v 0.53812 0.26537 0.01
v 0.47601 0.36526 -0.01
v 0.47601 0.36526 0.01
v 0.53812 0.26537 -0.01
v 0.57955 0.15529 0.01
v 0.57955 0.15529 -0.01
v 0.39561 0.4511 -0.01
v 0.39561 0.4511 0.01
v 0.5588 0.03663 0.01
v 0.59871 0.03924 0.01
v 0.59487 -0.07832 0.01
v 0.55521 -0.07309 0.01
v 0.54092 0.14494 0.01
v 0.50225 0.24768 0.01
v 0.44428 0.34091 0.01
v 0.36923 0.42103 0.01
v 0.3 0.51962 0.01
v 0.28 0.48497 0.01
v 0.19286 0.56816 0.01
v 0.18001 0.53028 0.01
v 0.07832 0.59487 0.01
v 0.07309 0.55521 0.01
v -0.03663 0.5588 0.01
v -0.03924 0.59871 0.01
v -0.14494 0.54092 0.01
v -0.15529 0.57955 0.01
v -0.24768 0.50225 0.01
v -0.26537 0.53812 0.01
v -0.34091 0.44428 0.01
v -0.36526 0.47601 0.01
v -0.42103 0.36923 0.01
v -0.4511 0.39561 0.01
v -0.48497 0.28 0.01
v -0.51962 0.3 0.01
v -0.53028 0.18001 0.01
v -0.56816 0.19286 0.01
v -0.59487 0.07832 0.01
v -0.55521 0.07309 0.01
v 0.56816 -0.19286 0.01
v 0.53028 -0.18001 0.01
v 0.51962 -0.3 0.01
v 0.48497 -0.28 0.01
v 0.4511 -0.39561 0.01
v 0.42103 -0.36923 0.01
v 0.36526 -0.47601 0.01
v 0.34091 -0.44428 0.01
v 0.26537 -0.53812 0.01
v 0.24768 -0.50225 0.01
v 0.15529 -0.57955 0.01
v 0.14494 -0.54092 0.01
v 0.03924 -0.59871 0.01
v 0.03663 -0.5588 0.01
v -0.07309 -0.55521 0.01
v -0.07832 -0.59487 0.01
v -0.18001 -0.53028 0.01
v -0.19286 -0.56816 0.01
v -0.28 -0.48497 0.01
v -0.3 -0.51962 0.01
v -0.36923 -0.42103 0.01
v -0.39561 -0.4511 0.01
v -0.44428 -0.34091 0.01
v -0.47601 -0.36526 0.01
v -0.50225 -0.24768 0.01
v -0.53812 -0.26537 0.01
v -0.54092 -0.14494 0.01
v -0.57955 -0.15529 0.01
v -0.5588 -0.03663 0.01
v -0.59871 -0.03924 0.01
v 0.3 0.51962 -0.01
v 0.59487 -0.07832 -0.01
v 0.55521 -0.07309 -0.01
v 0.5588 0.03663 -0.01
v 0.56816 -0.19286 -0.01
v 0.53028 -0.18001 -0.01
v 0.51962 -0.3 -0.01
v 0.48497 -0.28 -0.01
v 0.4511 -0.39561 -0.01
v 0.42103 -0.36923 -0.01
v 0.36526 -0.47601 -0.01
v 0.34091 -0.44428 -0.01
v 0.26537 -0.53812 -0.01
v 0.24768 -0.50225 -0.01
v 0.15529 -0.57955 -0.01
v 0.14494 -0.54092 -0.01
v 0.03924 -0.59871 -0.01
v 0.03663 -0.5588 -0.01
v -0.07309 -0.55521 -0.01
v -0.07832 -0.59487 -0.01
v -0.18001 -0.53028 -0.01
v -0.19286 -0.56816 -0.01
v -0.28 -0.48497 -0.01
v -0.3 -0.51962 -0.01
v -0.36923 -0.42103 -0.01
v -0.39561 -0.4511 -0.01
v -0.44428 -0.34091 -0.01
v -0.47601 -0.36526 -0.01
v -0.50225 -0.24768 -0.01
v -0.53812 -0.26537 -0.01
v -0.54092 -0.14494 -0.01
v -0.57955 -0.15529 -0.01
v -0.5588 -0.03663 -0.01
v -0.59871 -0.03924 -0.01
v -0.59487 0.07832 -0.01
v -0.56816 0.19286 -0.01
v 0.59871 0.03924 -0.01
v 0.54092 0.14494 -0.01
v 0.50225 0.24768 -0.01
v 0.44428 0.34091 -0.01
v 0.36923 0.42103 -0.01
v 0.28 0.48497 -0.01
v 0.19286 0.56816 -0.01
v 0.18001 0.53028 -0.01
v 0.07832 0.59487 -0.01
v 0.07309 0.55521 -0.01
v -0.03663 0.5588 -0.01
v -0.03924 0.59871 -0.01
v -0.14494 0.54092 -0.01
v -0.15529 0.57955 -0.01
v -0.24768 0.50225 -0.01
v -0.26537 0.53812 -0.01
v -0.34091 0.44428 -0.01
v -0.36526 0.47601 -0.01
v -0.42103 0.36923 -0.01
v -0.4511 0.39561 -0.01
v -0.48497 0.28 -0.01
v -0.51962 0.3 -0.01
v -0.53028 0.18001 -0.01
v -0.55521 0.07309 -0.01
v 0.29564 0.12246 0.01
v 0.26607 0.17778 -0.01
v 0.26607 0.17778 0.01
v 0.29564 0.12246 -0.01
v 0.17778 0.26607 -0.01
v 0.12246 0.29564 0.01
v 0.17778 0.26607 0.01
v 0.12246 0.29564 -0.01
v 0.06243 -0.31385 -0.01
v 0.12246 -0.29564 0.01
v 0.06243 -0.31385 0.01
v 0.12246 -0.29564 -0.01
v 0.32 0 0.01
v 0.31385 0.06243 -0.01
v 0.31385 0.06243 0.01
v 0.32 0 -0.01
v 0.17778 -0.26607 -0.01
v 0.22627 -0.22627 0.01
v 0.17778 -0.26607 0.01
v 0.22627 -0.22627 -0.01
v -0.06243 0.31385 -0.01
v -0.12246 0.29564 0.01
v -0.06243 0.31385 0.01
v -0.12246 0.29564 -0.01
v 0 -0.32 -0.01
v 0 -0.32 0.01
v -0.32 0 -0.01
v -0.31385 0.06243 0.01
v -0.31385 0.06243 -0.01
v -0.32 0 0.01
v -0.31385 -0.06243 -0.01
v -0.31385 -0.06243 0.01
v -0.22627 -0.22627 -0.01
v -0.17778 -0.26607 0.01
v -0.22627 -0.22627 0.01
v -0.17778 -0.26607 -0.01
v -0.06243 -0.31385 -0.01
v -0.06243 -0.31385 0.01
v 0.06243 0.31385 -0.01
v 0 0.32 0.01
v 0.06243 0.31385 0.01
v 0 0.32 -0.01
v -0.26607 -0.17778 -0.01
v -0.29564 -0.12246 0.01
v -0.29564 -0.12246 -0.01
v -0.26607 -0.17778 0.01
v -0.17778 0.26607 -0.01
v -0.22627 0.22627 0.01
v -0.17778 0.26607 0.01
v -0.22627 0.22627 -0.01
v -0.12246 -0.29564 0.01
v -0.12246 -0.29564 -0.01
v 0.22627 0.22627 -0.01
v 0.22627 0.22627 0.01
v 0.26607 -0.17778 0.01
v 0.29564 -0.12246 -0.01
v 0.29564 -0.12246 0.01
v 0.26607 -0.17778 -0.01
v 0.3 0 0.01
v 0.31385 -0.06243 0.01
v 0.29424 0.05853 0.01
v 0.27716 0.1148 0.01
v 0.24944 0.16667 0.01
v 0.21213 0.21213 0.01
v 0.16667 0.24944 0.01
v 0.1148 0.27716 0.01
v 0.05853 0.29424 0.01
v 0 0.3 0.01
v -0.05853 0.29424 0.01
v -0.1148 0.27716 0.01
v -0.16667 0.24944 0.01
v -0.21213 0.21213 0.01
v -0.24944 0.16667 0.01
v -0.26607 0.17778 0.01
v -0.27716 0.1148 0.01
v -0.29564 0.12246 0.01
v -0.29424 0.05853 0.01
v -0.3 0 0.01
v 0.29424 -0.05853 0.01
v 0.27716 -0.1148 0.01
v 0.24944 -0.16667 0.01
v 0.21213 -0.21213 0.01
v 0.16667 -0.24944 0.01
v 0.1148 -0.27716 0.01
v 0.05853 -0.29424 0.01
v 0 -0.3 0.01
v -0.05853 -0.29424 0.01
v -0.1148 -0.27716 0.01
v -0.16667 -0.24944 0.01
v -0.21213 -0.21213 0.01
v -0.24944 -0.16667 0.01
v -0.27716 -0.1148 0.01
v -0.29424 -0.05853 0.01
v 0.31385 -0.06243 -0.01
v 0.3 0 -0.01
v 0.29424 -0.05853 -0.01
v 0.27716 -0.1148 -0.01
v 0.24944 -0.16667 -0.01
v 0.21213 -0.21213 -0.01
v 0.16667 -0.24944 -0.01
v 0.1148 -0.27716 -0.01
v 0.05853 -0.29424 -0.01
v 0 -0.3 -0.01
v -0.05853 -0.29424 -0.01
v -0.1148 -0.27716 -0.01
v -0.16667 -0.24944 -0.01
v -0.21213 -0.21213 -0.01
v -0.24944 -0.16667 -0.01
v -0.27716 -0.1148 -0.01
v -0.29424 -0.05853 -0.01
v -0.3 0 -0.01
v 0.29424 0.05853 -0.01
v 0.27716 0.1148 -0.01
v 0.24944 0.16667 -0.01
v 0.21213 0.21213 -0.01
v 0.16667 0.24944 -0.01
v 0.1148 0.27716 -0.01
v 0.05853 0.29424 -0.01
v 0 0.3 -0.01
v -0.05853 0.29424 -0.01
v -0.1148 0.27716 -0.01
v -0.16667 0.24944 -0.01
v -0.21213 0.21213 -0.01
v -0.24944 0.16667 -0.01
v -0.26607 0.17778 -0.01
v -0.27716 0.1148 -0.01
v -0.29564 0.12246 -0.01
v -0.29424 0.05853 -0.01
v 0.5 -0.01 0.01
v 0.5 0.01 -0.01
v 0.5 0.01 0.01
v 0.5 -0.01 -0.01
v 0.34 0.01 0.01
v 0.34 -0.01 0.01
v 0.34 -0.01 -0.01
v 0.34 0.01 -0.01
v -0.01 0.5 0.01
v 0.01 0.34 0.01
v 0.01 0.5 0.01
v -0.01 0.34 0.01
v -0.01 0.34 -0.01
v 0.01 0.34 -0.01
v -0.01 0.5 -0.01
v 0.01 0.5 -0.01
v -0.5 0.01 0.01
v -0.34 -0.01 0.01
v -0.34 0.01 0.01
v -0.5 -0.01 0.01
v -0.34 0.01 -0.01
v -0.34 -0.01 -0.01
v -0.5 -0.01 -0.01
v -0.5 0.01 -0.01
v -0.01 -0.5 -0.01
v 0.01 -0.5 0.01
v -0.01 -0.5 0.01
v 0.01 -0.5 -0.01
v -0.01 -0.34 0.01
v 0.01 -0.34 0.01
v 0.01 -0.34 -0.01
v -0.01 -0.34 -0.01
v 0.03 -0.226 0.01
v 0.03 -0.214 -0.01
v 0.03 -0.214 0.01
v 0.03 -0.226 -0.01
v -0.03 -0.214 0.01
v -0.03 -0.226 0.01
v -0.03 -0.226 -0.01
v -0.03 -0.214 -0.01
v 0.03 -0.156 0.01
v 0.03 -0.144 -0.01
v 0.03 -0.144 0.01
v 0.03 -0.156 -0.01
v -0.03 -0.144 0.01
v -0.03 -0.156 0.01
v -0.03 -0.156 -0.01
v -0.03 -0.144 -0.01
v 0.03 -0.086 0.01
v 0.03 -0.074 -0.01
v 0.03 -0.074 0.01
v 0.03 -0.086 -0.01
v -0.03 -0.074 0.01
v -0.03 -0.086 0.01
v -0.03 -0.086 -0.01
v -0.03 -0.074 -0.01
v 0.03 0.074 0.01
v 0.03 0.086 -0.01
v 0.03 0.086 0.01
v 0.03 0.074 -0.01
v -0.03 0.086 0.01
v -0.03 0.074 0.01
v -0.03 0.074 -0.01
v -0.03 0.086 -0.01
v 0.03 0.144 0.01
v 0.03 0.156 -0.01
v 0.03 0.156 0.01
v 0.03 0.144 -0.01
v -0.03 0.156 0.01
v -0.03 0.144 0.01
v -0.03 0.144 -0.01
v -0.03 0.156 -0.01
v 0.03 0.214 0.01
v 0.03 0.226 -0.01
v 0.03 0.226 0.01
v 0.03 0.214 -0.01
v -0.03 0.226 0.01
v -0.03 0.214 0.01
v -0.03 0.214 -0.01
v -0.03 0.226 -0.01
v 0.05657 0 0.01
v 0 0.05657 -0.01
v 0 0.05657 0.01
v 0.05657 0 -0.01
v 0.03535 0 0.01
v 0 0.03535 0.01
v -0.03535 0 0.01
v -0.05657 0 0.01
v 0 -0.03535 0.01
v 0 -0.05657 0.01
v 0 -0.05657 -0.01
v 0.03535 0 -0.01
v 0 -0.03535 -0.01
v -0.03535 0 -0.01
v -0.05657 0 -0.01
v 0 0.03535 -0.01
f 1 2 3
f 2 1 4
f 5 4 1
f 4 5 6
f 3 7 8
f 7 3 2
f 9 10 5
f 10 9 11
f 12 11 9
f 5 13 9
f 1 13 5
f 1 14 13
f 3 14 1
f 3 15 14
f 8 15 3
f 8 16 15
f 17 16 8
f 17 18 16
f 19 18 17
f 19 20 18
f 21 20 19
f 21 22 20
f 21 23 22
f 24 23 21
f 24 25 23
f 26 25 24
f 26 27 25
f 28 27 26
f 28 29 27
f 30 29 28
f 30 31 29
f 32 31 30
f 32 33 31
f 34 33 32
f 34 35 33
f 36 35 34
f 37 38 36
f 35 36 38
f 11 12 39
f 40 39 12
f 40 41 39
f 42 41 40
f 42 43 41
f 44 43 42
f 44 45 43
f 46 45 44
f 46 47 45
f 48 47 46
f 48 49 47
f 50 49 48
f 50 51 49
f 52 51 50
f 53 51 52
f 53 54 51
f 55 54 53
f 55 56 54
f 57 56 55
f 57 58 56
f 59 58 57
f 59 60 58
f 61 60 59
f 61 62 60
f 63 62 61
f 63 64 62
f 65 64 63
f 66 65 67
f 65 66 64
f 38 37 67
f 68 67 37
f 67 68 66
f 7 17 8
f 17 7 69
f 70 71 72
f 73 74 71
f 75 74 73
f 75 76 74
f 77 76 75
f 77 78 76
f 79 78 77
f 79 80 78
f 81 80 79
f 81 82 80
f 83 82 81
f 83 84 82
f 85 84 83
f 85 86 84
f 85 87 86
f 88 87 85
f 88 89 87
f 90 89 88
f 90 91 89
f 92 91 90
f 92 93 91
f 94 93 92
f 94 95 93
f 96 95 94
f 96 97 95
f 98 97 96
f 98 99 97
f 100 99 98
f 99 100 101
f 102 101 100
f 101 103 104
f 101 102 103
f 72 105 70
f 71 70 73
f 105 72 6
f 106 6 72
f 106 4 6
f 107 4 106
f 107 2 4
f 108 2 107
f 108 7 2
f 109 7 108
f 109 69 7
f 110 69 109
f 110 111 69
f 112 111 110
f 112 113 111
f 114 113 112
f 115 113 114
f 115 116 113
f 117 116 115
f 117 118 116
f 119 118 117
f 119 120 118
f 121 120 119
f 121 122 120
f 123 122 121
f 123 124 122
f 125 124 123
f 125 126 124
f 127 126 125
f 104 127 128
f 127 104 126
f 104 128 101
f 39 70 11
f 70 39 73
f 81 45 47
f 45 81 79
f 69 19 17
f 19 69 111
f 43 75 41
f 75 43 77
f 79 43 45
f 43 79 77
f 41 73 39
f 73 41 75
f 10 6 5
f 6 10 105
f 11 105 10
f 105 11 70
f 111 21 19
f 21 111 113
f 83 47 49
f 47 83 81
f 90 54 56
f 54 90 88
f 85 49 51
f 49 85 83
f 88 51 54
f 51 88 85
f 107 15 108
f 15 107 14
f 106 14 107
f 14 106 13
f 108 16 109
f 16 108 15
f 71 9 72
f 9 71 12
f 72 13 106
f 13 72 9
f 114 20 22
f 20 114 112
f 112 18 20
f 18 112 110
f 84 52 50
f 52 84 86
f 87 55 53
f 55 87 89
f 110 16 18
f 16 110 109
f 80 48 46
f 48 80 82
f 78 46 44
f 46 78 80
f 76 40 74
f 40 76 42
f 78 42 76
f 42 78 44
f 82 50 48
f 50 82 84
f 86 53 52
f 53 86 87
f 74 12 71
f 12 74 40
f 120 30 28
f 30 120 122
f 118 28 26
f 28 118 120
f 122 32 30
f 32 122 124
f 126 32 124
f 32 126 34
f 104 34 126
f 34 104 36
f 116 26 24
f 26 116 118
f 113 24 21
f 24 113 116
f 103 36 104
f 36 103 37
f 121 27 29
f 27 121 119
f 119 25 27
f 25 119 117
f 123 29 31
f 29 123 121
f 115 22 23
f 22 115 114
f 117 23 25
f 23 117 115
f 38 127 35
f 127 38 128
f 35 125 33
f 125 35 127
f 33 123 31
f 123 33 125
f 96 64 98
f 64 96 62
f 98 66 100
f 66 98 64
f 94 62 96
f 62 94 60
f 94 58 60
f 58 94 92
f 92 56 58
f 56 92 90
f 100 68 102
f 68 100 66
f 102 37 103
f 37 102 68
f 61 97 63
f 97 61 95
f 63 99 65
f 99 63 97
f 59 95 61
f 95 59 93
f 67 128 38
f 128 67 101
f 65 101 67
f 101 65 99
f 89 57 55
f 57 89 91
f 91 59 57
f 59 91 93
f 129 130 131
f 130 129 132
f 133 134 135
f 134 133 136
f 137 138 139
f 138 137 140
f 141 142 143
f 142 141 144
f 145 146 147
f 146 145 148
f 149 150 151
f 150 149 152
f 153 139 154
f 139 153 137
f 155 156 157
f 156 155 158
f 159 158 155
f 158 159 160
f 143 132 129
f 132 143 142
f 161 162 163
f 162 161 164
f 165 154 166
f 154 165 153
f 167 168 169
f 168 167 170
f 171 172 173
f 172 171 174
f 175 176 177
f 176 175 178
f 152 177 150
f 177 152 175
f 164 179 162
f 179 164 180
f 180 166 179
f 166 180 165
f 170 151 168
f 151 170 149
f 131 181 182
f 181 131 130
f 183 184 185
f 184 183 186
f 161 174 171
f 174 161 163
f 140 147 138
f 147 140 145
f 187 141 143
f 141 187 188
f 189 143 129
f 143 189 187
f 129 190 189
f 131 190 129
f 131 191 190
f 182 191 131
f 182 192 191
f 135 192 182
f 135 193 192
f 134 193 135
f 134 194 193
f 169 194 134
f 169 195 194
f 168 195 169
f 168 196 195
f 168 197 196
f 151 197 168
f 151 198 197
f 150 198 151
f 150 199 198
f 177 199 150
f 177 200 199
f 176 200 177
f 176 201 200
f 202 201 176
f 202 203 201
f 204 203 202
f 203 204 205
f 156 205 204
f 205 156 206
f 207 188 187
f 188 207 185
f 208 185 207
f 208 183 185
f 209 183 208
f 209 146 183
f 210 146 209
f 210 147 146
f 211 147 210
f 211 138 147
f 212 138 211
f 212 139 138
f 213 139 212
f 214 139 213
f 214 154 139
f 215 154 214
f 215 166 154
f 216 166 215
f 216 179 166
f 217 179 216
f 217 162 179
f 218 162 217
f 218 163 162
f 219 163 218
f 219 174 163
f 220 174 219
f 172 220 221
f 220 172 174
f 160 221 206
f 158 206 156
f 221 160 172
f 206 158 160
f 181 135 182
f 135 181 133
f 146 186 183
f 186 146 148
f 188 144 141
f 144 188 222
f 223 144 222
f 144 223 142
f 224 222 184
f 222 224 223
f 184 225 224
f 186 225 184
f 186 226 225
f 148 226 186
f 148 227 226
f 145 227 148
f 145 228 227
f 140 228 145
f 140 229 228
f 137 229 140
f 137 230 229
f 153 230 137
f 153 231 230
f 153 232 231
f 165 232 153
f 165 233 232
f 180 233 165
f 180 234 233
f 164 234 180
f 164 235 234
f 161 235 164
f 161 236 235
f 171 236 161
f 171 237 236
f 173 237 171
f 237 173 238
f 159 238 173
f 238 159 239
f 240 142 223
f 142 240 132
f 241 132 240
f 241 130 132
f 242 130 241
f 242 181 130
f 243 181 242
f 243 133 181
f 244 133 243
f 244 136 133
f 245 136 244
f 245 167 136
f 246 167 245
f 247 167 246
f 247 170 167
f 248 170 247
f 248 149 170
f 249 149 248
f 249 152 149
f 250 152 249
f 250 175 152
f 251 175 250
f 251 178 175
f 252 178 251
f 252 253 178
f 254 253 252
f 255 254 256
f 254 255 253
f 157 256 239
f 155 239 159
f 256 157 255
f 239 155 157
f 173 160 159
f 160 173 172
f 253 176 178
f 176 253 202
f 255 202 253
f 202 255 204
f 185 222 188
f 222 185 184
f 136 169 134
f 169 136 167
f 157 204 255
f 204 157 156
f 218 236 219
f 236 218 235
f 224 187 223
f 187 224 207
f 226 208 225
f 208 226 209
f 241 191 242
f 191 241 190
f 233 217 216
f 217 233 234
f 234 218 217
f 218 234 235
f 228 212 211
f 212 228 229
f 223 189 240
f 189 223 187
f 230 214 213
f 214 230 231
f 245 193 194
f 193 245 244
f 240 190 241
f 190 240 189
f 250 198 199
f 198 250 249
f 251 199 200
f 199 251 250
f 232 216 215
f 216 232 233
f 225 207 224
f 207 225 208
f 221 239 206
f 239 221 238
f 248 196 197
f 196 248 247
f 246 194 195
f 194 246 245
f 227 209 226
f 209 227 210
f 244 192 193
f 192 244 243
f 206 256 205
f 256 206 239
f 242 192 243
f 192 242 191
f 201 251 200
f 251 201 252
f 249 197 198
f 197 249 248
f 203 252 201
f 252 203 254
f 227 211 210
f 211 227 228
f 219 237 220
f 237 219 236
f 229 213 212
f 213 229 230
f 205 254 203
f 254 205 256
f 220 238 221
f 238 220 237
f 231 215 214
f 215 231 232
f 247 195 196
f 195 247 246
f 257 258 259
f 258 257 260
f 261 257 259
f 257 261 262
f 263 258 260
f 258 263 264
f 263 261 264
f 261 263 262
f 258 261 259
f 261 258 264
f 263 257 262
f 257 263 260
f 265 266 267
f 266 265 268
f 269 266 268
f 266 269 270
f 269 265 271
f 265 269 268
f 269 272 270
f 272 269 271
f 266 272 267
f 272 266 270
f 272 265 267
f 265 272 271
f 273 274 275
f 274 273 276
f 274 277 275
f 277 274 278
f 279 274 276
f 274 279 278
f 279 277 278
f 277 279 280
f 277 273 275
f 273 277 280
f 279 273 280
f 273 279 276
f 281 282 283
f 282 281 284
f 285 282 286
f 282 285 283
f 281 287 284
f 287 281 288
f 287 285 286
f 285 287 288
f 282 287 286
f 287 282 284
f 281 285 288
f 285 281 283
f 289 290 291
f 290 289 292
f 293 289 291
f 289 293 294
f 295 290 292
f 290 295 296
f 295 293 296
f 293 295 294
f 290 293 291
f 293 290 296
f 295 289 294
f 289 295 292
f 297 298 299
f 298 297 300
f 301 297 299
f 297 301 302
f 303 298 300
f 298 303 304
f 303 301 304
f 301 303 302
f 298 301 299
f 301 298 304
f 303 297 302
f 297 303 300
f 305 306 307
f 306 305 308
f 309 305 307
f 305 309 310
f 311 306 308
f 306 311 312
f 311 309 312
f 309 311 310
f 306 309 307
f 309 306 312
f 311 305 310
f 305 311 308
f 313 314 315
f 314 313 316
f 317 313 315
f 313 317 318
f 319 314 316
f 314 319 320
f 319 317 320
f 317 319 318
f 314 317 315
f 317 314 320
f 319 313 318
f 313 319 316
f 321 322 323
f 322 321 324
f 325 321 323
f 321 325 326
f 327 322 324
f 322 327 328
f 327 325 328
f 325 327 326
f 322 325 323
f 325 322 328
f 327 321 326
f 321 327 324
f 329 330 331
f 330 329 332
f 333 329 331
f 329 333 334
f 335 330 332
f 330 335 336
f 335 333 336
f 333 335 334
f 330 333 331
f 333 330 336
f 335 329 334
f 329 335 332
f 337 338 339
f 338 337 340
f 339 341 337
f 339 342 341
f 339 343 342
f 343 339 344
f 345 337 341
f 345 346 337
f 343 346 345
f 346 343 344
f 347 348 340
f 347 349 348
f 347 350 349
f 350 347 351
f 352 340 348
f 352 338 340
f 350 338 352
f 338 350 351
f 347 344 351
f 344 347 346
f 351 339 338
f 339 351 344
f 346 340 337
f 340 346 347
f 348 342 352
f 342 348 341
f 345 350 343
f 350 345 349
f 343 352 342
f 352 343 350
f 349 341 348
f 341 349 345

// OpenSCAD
// camera_hud_reticle_tactical.scad
// Multi-ring segmented tactical camera reticle with elevation notches and central diamond.
// Designed for in-scene camera-projected 3D HUD targeting and inspection.

$fn = 32;

module camera_hud_reticle_tactical() {
    h = 0.02;

    // Outer segmented quadrant arcs
    for (a = [0, 90, 180, 270]) {
        rotate([0, 0, a + 15])
        difference() {
            cylinder(r = 0.60, h = h, center = true);
            cylinder(r = 0.56, h = h + 0.02, center = true);
            
            // Mask out 30 degrees of each quadrant to leave a 60 deg arc
            rotate([0, 0, 60])
            translate([1, 1, 0])
            cube([2, 2, h + 0.04], center = true);
            rotate([0, 0, 150])
            translate([1, 1, 0])
            cube([2, 2, h + 0.04], center = true);
        }
    }

    // Inner fine ring
    difference() {
        cylinder(r = 0.32, h = h, center = true);
        cylinder(r = 0.30, h = h + 0.02, center = true);
    }

    // Cardinal tick marks
    for (a = [0, 90, 180, 270]) {
        rotate([0, 0, a])
        translate([0.42, 0, 0])
        cube([0.16, 0.02, h], center = true);
    }

    // Elevation ladder notches (vertical ticks)
    for (y = [-0.22, -0.15, -0.08, 0.08, 0.15, 0.22]) {
        translate([0, y, 0])
        cube([0.06, 0.012, h], center = true);
    }

    // Center diamond aperture
    rotate([0, 0, 45])
    difference() {
        cube([0.08, 0.08, h], center = true);
        cube([0.05, 0.05, h + 0.02], center = true);
    }
}

camera_hud_reticle_tactical();
